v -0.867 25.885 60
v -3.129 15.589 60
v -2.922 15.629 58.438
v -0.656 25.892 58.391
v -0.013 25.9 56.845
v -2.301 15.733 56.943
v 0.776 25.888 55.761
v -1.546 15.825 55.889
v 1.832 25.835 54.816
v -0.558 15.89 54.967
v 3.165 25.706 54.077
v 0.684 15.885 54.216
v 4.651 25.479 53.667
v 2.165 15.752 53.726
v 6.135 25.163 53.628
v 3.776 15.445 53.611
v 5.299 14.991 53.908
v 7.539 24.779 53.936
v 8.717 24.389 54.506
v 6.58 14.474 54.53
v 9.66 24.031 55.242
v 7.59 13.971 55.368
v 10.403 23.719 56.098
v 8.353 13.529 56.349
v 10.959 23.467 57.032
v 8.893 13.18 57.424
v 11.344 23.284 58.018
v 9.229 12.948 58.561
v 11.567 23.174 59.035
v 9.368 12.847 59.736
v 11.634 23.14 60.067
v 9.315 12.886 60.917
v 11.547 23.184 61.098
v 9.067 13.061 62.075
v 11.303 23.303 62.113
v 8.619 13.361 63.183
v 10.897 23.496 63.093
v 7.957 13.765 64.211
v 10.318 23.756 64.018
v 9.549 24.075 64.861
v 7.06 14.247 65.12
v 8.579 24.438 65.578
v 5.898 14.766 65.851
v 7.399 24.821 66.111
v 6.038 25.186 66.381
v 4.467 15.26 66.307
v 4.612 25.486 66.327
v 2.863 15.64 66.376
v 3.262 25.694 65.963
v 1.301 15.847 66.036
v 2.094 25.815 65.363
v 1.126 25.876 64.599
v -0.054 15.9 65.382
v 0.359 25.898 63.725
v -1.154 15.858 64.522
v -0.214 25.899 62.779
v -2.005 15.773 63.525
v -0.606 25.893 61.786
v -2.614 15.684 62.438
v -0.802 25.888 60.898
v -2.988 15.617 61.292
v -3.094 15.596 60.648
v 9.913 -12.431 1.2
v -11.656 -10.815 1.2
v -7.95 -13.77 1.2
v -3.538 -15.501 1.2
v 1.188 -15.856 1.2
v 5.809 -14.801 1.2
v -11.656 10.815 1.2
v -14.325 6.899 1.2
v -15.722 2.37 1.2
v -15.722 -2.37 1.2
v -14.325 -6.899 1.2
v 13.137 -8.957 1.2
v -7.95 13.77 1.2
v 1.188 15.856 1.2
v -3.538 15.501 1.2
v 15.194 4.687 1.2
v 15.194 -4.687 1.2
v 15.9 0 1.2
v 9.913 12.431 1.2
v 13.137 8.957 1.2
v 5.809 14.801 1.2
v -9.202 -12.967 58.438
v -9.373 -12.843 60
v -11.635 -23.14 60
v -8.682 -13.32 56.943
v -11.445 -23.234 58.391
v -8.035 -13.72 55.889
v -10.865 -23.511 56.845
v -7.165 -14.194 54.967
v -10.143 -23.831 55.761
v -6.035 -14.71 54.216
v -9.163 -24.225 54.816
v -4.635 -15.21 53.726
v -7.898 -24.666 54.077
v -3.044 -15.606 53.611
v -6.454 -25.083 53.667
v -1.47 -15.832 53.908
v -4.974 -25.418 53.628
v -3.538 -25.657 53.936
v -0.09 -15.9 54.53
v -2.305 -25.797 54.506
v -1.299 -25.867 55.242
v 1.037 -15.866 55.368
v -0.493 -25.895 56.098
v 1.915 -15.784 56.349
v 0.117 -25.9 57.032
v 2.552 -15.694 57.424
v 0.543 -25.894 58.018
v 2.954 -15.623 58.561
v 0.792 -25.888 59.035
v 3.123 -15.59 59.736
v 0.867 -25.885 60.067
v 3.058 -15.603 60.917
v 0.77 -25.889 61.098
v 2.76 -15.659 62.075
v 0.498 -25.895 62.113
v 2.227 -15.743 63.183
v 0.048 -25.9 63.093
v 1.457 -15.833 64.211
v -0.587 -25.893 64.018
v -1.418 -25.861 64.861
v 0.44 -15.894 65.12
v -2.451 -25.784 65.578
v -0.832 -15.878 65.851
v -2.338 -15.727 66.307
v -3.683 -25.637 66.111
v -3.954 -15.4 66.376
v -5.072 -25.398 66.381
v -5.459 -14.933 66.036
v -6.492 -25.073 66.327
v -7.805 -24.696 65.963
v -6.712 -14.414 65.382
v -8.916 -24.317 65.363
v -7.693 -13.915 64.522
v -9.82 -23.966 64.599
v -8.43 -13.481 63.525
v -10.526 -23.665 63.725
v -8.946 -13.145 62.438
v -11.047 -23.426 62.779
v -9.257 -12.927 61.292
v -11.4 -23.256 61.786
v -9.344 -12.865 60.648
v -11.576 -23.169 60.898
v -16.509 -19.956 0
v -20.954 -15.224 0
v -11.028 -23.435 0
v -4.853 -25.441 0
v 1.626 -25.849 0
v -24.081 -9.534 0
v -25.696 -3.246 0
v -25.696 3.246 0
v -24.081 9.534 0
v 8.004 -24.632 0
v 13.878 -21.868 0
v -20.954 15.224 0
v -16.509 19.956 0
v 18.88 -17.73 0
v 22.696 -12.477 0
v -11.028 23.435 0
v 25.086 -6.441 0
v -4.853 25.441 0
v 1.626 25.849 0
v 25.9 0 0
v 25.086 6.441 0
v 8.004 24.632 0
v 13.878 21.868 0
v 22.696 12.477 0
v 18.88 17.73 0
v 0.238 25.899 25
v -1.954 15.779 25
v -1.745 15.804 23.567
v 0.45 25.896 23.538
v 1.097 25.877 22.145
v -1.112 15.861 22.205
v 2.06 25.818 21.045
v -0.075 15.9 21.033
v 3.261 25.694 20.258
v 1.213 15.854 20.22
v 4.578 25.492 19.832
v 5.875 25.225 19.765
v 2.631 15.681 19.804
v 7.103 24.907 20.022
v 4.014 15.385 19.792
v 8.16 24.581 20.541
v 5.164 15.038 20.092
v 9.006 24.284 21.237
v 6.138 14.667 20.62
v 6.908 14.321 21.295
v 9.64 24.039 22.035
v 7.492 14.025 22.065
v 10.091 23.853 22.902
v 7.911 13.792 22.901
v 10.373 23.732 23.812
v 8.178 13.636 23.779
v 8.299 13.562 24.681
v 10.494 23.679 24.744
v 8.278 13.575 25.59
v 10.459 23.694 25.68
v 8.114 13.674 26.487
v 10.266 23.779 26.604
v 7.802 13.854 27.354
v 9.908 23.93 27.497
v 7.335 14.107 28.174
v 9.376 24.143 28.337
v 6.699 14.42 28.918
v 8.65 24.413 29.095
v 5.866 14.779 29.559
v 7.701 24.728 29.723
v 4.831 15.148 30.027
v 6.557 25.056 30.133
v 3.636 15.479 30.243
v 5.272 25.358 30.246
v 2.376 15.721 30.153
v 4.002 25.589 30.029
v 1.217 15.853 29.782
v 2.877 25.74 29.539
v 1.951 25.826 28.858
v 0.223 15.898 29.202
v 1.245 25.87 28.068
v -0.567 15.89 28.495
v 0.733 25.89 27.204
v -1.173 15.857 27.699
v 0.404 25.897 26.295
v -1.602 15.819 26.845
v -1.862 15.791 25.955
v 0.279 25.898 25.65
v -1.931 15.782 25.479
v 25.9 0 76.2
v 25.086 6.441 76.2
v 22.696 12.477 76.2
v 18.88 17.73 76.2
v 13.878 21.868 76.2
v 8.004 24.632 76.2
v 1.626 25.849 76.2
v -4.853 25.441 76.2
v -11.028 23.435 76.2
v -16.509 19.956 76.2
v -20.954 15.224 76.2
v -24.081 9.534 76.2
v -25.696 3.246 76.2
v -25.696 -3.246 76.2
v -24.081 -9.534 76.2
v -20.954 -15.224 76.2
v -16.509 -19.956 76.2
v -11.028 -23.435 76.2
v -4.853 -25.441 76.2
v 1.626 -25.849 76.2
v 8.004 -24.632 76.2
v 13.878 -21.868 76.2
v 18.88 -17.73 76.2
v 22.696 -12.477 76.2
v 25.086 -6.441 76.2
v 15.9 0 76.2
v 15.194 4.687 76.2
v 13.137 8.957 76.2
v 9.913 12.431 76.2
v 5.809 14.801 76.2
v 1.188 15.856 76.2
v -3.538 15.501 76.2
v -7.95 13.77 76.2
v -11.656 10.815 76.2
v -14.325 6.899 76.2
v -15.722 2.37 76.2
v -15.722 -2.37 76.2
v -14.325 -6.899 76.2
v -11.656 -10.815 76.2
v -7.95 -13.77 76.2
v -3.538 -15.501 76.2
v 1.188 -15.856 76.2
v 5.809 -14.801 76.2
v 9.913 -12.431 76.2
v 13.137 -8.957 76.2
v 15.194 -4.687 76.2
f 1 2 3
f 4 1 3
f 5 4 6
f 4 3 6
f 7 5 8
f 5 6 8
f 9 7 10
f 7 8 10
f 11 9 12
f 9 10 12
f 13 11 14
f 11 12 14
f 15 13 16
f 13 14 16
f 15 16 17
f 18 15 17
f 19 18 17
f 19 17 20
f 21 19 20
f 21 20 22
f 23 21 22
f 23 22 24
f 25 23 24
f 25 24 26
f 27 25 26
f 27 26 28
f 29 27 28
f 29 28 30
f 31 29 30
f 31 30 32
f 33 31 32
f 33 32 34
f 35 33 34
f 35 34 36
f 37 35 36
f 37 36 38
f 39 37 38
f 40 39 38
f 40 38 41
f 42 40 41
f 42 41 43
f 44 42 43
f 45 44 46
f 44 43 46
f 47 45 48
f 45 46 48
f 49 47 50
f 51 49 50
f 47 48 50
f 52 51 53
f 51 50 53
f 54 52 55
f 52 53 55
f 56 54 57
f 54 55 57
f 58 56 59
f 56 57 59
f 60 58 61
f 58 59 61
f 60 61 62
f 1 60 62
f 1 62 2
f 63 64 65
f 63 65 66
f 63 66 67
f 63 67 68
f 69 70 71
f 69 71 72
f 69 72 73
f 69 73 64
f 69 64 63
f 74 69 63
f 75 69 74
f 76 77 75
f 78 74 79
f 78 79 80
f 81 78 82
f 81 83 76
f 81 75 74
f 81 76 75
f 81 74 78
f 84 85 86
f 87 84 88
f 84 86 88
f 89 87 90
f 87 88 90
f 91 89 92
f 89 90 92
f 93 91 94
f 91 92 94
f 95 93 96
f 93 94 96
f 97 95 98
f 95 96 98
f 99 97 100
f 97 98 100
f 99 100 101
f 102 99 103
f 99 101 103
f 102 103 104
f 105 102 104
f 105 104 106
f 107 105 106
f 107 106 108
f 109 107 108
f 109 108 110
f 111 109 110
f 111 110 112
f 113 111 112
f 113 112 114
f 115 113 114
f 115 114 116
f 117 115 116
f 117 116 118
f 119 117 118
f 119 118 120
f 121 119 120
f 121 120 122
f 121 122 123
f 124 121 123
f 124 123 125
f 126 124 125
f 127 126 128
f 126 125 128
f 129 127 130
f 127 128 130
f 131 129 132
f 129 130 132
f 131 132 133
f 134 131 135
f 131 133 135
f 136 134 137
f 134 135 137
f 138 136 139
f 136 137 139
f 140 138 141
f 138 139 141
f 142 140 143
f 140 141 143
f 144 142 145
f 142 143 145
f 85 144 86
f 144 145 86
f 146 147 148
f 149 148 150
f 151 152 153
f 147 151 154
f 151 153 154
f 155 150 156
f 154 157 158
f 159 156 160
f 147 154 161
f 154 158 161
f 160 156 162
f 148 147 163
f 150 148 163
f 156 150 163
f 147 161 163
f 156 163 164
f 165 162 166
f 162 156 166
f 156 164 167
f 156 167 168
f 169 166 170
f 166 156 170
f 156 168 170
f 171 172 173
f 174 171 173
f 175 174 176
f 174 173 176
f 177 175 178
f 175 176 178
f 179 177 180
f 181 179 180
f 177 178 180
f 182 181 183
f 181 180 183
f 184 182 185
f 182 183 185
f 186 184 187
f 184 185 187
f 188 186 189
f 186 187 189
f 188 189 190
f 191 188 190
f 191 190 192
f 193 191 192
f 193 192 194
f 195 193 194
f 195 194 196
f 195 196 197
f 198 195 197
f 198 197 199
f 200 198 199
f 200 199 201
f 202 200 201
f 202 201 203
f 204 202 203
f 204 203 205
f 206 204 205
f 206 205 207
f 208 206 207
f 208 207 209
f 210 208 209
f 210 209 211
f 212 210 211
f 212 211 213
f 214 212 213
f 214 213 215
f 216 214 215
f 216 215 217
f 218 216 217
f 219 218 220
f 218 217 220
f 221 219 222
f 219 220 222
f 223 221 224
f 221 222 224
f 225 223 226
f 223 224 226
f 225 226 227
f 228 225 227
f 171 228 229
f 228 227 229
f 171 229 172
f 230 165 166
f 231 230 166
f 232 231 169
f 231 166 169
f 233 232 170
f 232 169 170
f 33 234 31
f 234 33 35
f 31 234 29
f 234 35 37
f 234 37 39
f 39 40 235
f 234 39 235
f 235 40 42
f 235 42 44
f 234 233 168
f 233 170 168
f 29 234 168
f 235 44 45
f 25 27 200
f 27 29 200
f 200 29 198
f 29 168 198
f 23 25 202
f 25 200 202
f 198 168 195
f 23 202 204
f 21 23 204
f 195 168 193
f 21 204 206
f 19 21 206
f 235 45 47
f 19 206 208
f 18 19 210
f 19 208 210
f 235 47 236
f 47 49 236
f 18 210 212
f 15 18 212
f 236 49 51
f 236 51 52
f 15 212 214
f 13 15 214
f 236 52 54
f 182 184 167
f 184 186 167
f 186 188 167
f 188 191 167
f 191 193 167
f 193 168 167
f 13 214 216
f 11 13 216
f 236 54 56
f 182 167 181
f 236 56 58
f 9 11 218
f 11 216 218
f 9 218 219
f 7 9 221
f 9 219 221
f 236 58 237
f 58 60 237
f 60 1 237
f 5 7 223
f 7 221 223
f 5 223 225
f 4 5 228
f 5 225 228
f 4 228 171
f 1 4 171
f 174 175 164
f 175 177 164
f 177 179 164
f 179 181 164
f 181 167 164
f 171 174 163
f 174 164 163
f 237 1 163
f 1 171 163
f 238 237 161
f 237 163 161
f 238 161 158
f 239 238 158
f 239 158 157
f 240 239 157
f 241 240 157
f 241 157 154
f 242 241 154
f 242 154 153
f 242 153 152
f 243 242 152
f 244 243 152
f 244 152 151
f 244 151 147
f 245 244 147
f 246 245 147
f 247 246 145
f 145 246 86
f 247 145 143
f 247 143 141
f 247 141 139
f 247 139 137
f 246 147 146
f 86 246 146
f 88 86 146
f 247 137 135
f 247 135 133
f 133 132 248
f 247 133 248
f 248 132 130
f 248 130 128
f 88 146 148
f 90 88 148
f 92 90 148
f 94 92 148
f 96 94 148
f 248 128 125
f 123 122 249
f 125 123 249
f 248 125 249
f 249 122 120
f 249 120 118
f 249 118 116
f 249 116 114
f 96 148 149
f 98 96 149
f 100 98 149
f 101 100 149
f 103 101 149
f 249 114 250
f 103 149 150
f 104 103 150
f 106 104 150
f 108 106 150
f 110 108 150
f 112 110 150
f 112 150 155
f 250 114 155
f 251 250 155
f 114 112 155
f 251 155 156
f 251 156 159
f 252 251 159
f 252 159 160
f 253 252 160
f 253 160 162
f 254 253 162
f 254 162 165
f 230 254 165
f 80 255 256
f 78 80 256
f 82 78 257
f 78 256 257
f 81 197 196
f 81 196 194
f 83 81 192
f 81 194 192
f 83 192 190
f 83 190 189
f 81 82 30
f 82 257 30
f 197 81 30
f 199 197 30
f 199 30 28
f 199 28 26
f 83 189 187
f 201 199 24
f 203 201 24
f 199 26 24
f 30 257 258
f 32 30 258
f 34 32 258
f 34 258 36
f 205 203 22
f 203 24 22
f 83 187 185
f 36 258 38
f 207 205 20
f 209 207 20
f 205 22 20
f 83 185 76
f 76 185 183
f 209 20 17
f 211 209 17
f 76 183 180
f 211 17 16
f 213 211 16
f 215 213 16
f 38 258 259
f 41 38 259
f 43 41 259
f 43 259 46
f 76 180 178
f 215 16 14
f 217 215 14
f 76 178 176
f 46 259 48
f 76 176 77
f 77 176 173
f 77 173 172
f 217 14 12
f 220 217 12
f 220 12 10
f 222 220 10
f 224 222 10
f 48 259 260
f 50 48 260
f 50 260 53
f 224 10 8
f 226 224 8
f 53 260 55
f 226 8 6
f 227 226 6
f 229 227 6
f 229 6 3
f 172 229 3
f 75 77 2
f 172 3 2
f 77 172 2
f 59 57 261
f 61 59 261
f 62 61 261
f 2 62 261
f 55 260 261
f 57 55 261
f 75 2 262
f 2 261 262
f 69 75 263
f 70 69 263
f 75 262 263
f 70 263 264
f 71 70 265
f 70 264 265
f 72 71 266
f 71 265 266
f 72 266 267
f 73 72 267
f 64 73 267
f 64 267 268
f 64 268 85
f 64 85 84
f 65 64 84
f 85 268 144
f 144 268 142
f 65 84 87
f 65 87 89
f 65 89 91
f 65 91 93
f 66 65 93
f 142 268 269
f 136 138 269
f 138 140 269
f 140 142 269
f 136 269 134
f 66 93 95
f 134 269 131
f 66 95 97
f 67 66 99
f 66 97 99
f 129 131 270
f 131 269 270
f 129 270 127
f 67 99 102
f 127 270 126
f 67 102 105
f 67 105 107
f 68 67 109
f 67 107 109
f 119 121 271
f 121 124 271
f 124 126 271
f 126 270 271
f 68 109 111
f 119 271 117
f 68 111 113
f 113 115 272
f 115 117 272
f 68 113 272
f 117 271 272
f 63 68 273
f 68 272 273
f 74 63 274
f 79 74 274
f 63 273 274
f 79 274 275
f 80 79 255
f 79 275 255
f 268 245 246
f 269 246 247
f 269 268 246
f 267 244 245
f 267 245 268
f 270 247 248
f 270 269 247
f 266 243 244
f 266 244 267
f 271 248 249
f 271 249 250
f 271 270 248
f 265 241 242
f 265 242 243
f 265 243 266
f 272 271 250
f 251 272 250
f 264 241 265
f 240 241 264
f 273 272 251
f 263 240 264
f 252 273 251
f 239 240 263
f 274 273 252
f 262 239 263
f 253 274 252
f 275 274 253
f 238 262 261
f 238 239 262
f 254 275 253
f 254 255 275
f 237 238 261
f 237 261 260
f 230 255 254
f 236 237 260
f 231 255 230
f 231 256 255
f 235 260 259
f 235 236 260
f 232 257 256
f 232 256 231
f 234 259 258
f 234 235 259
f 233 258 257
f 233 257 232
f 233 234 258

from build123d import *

# Parameters (mm, degrees)
SKETCH1_R                        = 25.9
BOSS_EXTRUDE1_DEPTH              = 76.2
SKETCH2_R                        = 15.9
CUT_EXTRUDE1_DEPTH               = 75
F_10_5_10_5_DIAMETER_HOLE1_D     = 10.5
F_10_5_10_5_DIAMETER_HOLE1_DEPTH = 20
F_10_5_10_5_DIAMETER_HOLE1_TIP   = 3.15451825
F_12_8_12_8_DIAMETER_HOLE1_D     = 12.8
F_12_8_12_8_DIAMETER_HOLE1_DEPTH = 300
F_12_8_12_8_DIAMETER_HOLE1_TIP   = 3.845507962


with BuildPart() as part:
    # Sketch1 → Boss-Extrude1 (new body)
    with BuildSketch(Plane.XY):
        Circle(SKETCH1_R)
    extrude(amount=BOSS_EXTRUDE1_DEPTH)

    # Sketch2 → Cut-Extrude1 (cut)
    with BuildSketch(Plane.XY.offset(76.2)):
        Circle(SKETCH2_R)
    extrude(amount=-CUT_EXTRUDE1_DEPTH, mode=Mode.SUBTRACT)

    # Ø10.5 (10.5) Diameter Hole1
    with Locations(Plane(origin=(5.482930922, 25.312990114, 25), x_dir=(0.977335526, -0.211696175, 0), z_dir=(0.211696175, 0.977335526, 0))):
        with Locations((0, 0)):
            Hole(F_10_5_10_5_DIAMETER_HOLE1_D / 2, depth=F_10_5_10_5_DIAMETER_HOLE1_DEPTH)
            with Locations((0, 0, -(F_10_5_10_5_DIAMETER_HOLE1_DEPTH + F_10_5_10_5_DIAMETER_HOLE1_TIP / 2))):  # 118° drill point
                Cone(0, F_10_5_10_5_DIAMETER_HOLE1_D / 2, F_10_5_10_5_DIAMETER_HOLE1_TIP, mode=Mode.SUBTRACT)

    # Ø12.8 (12.8) Diameter Hole1
    with Locations(Plane(origin=(5.555887044, 25.297073879, 60), x_dir=(0.976721125, -0.214513041, 0), z_dir=(0.214513041, 0.976721125, 0))):
        with Locations((0, 0)):
            Hole(F_12_8_12_8_DIAMETER_HOLE1_D / 2, depth=F_12_8_12_8_DIAMETER_HOLE1_DEPTH)
            with Locations((0, 0, -(F_12_8_12_8_DIAMETER_HOLE1_DEPTH + F_12_8_12_8_DIAMETER_HOLE1_TIP / 2))):  # 118° drill point
                Cone(0, F_12_8_12_8_DIAMETER_HOLE1_D / 2, F_12_8_12_8_DIAMETER_HOLE1_TIP, mode=Mode.SUBTRACT)


solid = part.part
